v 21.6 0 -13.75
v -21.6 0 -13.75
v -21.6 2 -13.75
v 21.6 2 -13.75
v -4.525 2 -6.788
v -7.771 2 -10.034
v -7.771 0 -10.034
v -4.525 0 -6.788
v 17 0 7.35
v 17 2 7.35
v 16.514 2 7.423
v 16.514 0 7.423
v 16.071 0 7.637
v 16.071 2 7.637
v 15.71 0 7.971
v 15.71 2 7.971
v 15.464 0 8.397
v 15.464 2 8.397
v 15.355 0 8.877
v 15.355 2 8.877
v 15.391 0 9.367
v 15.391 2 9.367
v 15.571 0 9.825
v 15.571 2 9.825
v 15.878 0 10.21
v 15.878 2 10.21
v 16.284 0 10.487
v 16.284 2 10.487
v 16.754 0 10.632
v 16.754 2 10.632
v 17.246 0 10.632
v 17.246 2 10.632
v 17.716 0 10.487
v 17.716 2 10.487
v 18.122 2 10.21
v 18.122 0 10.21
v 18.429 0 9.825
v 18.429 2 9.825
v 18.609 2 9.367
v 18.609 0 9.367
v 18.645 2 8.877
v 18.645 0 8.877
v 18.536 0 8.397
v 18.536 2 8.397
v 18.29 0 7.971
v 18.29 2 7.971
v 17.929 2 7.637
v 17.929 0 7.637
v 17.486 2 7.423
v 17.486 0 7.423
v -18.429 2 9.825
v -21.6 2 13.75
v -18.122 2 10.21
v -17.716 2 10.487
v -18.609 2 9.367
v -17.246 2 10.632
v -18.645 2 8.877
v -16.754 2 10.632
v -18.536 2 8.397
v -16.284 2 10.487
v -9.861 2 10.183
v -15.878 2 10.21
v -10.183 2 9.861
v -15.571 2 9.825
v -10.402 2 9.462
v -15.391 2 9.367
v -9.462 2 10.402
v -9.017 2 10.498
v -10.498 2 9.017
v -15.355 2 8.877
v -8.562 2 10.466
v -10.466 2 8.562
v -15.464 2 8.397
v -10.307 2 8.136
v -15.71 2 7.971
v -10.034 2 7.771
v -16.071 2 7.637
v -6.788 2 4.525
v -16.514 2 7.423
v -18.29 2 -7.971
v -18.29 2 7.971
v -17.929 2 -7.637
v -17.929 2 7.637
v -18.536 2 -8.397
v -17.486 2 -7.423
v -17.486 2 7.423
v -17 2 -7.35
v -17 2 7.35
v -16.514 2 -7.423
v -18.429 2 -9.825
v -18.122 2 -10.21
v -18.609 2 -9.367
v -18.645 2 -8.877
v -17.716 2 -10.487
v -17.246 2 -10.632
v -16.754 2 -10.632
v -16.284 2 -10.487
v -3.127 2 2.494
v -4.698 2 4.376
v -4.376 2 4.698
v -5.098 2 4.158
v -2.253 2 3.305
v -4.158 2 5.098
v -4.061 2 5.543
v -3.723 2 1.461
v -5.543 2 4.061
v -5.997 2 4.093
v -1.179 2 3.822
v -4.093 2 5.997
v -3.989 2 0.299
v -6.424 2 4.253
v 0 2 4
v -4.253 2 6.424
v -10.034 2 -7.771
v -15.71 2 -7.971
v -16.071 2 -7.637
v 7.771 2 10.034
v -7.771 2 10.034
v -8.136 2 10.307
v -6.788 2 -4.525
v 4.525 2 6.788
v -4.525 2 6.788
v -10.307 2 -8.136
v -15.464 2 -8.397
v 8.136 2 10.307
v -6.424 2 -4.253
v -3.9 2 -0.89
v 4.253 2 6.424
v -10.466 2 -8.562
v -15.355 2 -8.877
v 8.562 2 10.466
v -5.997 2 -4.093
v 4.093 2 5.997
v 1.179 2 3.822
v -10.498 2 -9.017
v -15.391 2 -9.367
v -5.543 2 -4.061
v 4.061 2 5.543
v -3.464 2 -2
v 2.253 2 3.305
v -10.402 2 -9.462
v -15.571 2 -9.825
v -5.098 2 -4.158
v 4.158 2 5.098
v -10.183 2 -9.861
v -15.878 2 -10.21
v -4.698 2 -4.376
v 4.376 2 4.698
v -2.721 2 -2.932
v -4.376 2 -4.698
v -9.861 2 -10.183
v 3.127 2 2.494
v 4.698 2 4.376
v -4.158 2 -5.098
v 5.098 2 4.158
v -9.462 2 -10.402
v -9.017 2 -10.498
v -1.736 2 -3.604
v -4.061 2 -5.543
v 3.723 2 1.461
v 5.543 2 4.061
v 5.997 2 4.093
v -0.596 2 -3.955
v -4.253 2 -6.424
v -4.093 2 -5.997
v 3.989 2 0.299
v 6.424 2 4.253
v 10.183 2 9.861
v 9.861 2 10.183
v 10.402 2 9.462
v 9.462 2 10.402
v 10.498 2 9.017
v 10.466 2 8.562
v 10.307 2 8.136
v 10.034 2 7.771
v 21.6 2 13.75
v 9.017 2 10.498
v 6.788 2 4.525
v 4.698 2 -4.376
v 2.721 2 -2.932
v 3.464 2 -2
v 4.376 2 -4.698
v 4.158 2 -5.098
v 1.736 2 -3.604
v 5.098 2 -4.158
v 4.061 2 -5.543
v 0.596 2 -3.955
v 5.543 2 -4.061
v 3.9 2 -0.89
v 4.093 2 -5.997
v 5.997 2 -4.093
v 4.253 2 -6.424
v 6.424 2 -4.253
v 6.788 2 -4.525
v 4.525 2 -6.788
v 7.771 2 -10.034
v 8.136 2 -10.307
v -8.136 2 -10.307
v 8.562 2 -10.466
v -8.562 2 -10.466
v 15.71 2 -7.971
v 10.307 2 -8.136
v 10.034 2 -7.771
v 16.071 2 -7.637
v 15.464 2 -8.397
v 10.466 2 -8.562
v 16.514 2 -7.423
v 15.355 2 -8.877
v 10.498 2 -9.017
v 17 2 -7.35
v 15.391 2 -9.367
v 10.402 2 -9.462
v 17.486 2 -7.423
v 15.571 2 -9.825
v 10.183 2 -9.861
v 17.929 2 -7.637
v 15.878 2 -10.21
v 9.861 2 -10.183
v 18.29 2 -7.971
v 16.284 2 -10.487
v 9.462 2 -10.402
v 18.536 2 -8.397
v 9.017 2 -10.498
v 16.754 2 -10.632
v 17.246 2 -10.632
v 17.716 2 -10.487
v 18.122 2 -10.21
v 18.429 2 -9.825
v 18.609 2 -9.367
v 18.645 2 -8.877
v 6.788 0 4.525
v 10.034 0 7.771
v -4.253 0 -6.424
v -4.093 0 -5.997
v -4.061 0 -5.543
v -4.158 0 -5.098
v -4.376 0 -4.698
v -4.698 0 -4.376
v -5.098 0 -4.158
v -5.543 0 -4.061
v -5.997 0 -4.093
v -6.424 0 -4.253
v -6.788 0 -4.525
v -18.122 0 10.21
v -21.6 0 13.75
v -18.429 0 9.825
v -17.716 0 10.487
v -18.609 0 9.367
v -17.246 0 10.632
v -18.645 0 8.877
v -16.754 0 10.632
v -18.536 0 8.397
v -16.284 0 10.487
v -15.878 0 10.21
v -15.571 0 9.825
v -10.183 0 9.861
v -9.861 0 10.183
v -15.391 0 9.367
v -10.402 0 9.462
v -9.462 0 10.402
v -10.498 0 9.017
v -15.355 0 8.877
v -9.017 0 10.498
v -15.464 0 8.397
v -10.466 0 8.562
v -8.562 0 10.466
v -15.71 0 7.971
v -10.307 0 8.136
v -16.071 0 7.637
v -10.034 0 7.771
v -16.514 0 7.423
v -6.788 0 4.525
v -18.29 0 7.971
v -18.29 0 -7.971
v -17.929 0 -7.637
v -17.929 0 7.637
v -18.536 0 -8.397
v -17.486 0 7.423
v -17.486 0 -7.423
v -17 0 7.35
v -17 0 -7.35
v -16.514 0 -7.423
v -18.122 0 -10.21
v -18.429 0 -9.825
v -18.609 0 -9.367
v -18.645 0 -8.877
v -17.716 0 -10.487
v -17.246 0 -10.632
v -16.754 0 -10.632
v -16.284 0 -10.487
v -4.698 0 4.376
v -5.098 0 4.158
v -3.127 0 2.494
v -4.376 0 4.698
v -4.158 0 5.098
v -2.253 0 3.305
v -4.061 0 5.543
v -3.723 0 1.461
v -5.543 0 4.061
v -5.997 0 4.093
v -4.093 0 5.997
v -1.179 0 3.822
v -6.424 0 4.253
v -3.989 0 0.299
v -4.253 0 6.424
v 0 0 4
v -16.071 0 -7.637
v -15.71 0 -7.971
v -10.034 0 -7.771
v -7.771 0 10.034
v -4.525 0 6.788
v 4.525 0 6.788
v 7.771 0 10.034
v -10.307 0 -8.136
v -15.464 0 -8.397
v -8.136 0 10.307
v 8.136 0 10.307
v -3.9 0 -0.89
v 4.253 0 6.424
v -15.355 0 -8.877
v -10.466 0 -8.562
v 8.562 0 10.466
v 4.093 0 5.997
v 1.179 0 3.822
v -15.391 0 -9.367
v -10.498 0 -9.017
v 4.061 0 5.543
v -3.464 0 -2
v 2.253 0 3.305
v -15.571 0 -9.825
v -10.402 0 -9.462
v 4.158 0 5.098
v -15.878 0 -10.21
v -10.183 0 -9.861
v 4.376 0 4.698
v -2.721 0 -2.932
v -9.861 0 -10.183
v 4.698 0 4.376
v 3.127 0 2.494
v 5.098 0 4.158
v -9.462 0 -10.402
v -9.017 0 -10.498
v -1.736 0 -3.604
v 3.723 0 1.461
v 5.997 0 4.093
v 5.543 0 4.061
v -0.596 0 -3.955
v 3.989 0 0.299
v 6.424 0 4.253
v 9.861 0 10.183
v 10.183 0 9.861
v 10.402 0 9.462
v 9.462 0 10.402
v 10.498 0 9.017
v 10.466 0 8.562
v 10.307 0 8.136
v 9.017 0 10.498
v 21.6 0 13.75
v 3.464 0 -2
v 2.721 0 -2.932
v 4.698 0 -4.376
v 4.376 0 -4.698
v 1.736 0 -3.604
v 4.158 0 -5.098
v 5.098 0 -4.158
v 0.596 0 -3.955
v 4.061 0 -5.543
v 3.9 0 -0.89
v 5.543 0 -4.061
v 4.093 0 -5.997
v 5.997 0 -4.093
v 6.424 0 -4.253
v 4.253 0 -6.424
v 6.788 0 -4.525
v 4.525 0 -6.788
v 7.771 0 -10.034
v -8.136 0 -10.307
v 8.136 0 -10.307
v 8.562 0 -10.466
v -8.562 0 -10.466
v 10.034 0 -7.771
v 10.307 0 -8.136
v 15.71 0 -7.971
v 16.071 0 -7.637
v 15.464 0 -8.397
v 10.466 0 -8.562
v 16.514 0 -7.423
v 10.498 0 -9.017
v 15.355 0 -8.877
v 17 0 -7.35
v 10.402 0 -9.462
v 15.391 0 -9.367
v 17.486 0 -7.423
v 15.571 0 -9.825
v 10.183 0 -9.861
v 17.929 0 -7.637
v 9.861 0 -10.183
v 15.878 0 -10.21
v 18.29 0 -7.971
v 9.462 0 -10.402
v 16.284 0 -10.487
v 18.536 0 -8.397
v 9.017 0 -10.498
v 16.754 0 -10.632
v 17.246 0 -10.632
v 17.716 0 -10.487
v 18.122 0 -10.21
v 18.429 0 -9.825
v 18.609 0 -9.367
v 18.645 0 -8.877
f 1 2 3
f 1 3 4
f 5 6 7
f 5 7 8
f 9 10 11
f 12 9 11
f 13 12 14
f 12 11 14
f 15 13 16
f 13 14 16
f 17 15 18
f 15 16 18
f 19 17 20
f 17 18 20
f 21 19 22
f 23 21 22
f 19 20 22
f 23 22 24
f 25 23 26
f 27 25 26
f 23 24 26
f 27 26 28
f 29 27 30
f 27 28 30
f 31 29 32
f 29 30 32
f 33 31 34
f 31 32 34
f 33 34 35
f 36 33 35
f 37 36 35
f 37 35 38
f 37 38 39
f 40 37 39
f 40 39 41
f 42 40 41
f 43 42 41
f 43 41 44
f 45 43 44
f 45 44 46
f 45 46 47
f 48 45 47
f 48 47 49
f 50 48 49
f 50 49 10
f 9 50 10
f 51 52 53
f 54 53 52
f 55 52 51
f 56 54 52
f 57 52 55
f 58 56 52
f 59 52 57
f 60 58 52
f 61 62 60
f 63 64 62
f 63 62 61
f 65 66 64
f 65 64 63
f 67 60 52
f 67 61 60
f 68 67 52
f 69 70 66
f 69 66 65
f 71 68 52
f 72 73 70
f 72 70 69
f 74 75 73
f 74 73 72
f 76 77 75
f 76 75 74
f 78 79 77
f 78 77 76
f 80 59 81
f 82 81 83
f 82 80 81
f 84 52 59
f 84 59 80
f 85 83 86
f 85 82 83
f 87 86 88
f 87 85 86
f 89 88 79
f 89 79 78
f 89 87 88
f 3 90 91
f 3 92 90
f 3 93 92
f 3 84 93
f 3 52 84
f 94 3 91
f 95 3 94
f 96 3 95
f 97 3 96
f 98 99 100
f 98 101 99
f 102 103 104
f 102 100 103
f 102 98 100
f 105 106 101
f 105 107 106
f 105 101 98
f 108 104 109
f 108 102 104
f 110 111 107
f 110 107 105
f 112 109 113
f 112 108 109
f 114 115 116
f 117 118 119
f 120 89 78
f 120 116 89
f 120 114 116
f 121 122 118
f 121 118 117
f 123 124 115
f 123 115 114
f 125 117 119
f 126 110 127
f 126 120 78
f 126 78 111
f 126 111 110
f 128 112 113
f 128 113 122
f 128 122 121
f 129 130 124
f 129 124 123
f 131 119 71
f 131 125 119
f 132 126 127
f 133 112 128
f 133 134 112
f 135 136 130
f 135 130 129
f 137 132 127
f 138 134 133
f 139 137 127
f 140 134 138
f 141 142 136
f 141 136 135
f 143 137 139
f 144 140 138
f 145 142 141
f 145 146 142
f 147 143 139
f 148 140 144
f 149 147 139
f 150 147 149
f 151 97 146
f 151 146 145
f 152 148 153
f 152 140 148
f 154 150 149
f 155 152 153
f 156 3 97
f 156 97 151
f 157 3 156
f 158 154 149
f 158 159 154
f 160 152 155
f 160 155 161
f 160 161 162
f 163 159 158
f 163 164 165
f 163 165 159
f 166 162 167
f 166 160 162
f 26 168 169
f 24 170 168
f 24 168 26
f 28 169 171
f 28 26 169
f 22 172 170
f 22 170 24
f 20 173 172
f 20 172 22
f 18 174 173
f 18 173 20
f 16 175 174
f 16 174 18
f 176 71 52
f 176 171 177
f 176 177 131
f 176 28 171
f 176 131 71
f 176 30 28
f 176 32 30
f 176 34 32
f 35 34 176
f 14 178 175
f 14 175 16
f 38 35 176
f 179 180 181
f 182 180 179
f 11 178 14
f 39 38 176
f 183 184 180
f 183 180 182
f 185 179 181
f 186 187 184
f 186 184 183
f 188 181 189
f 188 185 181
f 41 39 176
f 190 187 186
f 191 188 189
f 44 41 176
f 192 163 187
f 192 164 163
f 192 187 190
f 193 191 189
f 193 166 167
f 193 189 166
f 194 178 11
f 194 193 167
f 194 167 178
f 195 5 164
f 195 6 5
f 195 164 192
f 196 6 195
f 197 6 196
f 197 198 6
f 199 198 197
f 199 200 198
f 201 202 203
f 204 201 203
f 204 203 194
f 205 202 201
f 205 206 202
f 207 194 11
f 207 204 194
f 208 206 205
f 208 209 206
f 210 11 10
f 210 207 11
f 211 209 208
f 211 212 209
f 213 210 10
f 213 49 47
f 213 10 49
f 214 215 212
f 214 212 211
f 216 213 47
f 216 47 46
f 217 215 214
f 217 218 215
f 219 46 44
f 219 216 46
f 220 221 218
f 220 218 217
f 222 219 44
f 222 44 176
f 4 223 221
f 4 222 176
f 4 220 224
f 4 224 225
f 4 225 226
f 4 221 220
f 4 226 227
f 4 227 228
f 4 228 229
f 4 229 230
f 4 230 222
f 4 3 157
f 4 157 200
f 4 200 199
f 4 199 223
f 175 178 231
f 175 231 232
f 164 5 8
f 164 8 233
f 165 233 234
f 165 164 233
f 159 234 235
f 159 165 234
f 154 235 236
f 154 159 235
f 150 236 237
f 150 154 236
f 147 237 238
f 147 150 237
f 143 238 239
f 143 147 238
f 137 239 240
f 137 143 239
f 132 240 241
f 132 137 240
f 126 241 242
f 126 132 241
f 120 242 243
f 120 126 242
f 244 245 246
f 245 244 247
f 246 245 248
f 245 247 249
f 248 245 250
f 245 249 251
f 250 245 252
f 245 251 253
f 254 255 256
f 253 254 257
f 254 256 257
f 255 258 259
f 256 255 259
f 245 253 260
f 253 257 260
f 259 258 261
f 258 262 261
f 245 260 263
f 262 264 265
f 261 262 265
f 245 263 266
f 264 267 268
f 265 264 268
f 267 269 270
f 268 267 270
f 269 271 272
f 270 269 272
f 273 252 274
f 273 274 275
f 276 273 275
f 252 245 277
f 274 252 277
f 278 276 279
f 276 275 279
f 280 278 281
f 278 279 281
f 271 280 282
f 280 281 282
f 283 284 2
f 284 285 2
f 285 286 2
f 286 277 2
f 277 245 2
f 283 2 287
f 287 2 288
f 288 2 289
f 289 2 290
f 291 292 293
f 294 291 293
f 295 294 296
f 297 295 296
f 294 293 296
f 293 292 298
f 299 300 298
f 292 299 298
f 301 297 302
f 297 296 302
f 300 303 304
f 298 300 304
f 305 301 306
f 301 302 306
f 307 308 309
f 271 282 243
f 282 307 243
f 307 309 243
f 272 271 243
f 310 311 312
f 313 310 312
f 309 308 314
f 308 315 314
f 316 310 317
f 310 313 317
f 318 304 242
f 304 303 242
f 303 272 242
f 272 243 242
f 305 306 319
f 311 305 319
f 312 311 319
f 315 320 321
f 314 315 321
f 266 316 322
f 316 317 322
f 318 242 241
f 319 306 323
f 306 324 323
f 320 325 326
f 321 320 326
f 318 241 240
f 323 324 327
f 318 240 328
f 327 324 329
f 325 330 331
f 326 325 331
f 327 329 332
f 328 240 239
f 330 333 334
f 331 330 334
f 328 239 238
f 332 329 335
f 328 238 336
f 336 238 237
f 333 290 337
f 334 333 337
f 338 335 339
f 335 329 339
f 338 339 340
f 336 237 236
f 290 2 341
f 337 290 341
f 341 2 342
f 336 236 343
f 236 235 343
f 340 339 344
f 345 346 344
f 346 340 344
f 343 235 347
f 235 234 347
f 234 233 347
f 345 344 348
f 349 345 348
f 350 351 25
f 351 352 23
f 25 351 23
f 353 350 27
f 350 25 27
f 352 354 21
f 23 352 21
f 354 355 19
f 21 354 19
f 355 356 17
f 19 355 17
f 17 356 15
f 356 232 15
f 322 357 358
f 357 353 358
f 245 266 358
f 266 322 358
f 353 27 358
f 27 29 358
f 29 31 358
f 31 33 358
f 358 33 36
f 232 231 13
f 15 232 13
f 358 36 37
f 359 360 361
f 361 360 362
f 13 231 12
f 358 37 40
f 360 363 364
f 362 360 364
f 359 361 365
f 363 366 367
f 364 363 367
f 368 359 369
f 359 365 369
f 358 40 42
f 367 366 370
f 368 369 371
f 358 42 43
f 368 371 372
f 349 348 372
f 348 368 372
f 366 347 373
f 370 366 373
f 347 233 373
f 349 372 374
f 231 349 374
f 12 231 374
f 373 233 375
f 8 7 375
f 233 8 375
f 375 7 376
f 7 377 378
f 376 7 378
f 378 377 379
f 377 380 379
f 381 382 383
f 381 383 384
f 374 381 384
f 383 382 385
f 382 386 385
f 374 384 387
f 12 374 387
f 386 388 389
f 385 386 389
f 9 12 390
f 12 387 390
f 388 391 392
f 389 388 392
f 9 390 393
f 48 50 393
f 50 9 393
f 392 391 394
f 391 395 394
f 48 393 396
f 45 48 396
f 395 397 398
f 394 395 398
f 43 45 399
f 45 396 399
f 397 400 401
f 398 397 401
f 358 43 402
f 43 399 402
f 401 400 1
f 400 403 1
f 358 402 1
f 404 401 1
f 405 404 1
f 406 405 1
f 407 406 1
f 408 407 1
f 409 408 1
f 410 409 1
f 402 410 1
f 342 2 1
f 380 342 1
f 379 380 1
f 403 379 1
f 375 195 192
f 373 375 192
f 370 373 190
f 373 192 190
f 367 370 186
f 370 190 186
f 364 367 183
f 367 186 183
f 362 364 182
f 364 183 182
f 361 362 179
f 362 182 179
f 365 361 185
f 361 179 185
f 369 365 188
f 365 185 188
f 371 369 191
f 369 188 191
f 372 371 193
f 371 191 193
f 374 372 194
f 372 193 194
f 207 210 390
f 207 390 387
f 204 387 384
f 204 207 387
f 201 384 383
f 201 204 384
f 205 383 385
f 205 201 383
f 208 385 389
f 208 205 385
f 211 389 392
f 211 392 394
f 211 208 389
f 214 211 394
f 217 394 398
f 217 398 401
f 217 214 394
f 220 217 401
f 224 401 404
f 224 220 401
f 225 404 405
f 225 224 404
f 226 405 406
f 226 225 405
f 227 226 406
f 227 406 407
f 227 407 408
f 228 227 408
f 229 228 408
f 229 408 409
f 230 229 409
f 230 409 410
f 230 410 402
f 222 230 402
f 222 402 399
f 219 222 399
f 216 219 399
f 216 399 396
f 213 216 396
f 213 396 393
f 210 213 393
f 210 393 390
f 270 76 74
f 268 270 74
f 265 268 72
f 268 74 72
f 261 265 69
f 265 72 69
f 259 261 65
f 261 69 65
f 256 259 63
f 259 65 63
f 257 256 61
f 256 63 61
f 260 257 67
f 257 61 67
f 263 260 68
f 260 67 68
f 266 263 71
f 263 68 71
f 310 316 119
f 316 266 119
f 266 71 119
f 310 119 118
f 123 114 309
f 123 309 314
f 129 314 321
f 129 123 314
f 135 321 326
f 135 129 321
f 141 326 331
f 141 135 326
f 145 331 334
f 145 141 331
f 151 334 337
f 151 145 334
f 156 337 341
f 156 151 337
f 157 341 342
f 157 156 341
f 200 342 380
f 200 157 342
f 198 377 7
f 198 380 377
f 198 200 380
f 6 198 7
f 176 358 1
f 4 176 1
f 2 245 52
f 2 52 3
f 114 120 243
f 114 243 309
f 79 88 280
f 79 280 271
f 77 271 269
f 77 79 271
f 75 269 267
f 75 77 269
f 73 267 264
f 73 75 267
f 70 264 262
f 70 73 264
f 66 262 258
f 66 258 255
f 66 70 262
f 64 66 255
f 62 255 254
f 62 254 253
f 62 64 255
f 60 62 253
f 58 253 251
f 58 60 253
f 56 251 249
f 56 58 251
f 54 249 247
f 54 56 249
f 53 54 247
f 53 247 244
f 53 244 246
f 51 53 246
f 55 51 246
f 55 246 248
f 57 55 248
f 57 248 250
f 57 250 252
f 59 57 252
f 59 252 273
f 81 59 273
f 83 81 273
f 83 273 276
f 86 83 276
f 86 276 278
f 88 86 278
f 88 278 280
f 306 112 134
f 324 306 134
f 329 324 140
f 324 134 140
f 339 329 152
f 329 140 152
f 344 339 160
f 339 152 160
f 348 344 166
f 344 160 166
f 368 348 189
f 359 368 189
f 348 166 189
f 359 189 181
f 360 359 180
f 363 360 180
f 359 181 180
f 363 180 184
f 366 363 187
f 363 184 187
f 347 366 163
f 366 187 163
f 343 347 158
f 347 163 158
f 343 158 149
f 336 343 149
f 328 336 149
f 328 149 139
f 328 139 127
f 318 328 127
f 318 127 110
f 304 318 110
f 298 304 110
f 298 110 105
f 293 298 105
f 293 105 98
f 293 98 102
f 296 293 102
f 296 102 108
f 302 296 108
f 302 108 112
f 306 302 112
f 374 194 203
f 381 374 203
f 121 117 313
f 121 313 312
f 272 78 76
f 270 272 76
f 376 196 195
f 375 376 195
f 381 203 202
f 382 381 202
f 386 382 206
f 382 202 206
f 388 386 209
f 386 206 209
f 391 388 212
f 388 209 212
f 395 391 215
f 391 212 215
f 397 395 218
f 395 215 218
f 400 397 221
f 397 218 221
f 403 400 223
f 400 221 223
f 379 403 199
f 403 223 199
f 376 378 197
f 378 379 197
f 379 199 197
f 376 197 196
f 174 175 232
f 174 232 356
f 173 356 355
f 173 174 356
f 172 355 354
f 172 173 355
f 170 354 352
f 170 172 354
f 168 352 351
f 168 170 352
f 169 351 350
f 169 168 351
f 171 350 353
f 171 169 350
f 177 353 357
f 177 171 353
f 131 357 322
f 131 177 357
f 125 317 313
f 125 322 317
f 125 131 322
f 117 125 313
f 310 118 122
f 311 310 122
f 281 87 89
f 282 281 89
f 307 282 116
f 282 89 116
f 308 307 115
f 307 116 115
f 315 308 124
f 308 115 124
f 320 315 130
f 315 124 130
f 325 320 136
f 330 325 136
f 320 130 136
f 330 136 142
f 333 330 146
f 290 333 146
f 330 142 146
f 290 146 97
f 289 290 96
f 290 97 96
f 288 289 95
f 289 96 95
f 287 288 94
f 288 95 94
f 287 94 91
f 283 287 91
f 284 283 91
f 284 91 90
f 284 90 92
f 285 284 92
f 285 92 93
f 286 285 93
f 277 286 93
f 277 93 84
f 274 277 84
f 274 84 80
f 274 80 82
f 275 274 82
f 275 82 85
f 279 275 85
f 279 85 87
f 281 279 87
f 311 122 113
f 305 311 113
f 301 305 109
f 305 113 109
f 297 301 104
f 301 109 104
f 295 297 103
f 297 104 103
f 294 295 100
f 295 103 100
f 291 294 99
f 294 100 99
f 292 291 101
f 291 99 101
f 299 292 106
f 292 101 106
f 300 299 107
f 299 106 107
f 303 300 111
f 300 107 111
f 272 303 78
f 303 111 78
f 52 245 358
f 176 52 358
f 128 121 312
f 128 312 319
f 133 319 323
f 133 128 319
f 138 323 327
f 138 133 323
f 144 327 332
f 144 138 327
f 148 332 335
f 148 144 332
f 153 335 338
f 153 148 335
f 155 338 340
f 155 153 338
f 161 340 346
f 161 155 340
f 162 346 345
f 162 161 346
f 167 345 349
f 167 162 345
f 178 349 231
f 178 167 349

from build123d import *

# Parameters (mm, degrees)
SKETCH_1_W               = 43.2
SKETCH_1_H               = 27.5
EXTRUDE_1_DEPTH          = 2
CUT_EXTRUDE_1_REACH      = 27.683
SKETCH_2_R               = 1.65
CUT_EXTRUDE_2_REACH      = 27.683
MIRROR_2_COPY_1_REACH    = 27.683
MIRROR_2_COPY_1_SKETCH_R = 1.65
MIRROR_2_COPY_2_REACH    = 27.683
CUT_EXTRUDE_3_REACH      = 27.683
SKETCH_4_R               = 4


with BuildPart() as part:
    # 草图1 → 凸台-拉伸1 (new body)
    with BuildSketch(Plane(origin=(0, 0, 0), x_dir=(1, 0, 0), z_dir=(0, 1, 0))):
        Rectangle(SKETCH_1_W, SKETCH_1_H)
    extrude(amount=EXTRUDE_1_DEPTH)

    # 草图2 → 切除-拉伸1 (cut, up to next)
    with BuildSketch(Plane(origin=(0, 2, 0), x_dir=(1, 0, 0), z_dir=(0, 1, 0)), mode=Mode.PRIVATE) as cut_extrude_1_sk1:
        with Locations(Location((-17, 9, 0), (0, 0, 270))):
            Circle(SKETCH_2_R)
    cut_extrude_1_tool1 = extrude(cut_extrude_1_sk1.sketch, amount=-CUT_EXTRUDE_1_REACH, mode=Mode.PRIVATE) & part.part
    cut_extrude_1 = cut_extrude_1_tool1.solids().sort_by_distance((-17, 2, -9))[0]
    add(cut_extrude_1, mode=Mode.SUBTRACT)

    # 草图3 → 切除-拉伸2 (cut, up to next)
    with BuildSketch(Plane(origin=(0, 2, 0), x_dir=(1, 0, 0), z_dir=(0, 1, 0)), mode=Mode.PRIVATE) as cut_extrude_2_sk1:
        with BuildLine():
            Line((-6.788225099, 4.5254834), (-10.033845225, 7.771103525))
            ThreePointArc((-10.033845225, 7.771103525), (-10.033845225, 10.033845225), (-7.771103525, 10.033845225))
            Line((-7.771103525, 10.033845225), (-4.5254834, 6.788225099))
            ThreePointArc((-4.5254834, 6.788225099), (-4.5254834, 4.5254834), (-6.788225099, 4.5254834))
        make_face()
    cut_extrude_2_tool1 = extrude(cut_extrude_2_sk1.sketch, amount=-CUT_EXTRUDE_2_REACH, mode=Mode.PRIVATE) & part.part
    cut_extrude_2 = cut_extrude_2_tool1.solids().sort_by_distance((-7.279664, 2, -7.279664))[0]
    add(cut_extrude_2, mode=Mode.SUBTRACT)

    # 镜向1: 切除-拉伸1, 切除-拉伸2 across plane
    add(cut_extrude_1.mirror(Plane.XY), mode=Mode.SUBTRACT)
    add(cut_extrude_2.mirror(Plane.XY), mode=Mode.SUBTRACT)

    # 镜向2: 切除-拉伸1, 切除-拉伸2 across plane
    add(cut_extrude_1.mirror(Plane(origin=(0, 0, 0), x_dir=(0, 0, 1), z_dir=(1, 0, 0))), mode=Mode.SUBTRACT)
    add(cut_extrude_2.mirror(Plane(origin=(0, 0, 0), x_dir=(0, 0, 1), z_dir=(1, 0, 0))), mode=Mode.SUBTRACT)

    # 镜向2 copy 1 sketch → 镜向2 copy 1 (cut, up to next)
    with BuildSketch(Plane(origin=(0, 2, 0), x_dir=(-1, 0, 0), z_dir=(0, 1, 0)), mode=Mode.PRIVATE) as mirror_2_copy_1_sk1:
        with Locations(Location((-17, 9, 0), (0, 0, 270))):
            Circle(MIRROR_2_COPY_1_SKETCH_R)
    mirror_2_copy_1_tool1 = extrude(mirror_2_copy_1_sk1.sketch, amount=-MIRROR_2_COPY_1_REACH, mode=Mode.PRIVATE) & part.part
    add(mirror_2_copy_1_tool1.solids().sort_by_distance((17, 2, 9))[0], mode=Mode.SUBTRACT)

    # 镜向2 copy 2 sketch → 镜向2 copy 2 (cut, up to next)
    with BuildSketch(Plane(origin=(0, 2, 0), x_dir=(-1, 0, 0), z_dir=(0, 1, 0)), mode=Mode.PRIVATE) as mirror_2_copy_2_sk1:
        with BuildLine():
            Line((-6.788225099, 4.5254834), (-10.033845225, 7.771103525))
            ThreePointArc((-10.033845225, 7.771103525), (-10.033845225, 10.033845225), (-7.771103525, 10.033845225))
            Line((-7.771103525, 10.033845225), (-4.5254834, 6.788225099))
            ThreePointArc((-4.5254834, 6.788225099), (-4.5254834, 4.5254834), (-6.788225099, 4.5254834))
        make_face()
    mirror_2_copy_2_tool1 = extrude(mirror_2_copy_2_sk1.sketch, amount=-MIRROR_2_COPY_2_REACH, mode=Mode.PRIVATE) & part.part
    add(mirror_2_copy_2_tool1.solids().sort_by_distance((7.279664, 2, 7.279664))[0], mode=Mode.SUBTRACT)

    # 草图4 → 切除-拉伸3 (cut, up to next)
    with BuildSketch(Plane(origin=(0, 2, 0), x_dir=(1, 0, 0), z_dir=(0, 1, 0)), mode=Mode.PRIVATE) as cut_extrude_3_sk1:
        with Locations(Location((0, 0, 0), (0, 0, 270))):
            Circle(SKETCH_4_R)
    cut_extrude_3_tool1 = extrude(cut_extrude_3_sk1.sketch, amount=-CUT_EXTRUDE_3_REACH, mode=Mode.PRIVATE) & part.part
    add(cut_extrude_3_tool1.solids().sort_by_distance((0, 2, 0))[0], mode=Mode.SUBTRACT)


solid = part.part
